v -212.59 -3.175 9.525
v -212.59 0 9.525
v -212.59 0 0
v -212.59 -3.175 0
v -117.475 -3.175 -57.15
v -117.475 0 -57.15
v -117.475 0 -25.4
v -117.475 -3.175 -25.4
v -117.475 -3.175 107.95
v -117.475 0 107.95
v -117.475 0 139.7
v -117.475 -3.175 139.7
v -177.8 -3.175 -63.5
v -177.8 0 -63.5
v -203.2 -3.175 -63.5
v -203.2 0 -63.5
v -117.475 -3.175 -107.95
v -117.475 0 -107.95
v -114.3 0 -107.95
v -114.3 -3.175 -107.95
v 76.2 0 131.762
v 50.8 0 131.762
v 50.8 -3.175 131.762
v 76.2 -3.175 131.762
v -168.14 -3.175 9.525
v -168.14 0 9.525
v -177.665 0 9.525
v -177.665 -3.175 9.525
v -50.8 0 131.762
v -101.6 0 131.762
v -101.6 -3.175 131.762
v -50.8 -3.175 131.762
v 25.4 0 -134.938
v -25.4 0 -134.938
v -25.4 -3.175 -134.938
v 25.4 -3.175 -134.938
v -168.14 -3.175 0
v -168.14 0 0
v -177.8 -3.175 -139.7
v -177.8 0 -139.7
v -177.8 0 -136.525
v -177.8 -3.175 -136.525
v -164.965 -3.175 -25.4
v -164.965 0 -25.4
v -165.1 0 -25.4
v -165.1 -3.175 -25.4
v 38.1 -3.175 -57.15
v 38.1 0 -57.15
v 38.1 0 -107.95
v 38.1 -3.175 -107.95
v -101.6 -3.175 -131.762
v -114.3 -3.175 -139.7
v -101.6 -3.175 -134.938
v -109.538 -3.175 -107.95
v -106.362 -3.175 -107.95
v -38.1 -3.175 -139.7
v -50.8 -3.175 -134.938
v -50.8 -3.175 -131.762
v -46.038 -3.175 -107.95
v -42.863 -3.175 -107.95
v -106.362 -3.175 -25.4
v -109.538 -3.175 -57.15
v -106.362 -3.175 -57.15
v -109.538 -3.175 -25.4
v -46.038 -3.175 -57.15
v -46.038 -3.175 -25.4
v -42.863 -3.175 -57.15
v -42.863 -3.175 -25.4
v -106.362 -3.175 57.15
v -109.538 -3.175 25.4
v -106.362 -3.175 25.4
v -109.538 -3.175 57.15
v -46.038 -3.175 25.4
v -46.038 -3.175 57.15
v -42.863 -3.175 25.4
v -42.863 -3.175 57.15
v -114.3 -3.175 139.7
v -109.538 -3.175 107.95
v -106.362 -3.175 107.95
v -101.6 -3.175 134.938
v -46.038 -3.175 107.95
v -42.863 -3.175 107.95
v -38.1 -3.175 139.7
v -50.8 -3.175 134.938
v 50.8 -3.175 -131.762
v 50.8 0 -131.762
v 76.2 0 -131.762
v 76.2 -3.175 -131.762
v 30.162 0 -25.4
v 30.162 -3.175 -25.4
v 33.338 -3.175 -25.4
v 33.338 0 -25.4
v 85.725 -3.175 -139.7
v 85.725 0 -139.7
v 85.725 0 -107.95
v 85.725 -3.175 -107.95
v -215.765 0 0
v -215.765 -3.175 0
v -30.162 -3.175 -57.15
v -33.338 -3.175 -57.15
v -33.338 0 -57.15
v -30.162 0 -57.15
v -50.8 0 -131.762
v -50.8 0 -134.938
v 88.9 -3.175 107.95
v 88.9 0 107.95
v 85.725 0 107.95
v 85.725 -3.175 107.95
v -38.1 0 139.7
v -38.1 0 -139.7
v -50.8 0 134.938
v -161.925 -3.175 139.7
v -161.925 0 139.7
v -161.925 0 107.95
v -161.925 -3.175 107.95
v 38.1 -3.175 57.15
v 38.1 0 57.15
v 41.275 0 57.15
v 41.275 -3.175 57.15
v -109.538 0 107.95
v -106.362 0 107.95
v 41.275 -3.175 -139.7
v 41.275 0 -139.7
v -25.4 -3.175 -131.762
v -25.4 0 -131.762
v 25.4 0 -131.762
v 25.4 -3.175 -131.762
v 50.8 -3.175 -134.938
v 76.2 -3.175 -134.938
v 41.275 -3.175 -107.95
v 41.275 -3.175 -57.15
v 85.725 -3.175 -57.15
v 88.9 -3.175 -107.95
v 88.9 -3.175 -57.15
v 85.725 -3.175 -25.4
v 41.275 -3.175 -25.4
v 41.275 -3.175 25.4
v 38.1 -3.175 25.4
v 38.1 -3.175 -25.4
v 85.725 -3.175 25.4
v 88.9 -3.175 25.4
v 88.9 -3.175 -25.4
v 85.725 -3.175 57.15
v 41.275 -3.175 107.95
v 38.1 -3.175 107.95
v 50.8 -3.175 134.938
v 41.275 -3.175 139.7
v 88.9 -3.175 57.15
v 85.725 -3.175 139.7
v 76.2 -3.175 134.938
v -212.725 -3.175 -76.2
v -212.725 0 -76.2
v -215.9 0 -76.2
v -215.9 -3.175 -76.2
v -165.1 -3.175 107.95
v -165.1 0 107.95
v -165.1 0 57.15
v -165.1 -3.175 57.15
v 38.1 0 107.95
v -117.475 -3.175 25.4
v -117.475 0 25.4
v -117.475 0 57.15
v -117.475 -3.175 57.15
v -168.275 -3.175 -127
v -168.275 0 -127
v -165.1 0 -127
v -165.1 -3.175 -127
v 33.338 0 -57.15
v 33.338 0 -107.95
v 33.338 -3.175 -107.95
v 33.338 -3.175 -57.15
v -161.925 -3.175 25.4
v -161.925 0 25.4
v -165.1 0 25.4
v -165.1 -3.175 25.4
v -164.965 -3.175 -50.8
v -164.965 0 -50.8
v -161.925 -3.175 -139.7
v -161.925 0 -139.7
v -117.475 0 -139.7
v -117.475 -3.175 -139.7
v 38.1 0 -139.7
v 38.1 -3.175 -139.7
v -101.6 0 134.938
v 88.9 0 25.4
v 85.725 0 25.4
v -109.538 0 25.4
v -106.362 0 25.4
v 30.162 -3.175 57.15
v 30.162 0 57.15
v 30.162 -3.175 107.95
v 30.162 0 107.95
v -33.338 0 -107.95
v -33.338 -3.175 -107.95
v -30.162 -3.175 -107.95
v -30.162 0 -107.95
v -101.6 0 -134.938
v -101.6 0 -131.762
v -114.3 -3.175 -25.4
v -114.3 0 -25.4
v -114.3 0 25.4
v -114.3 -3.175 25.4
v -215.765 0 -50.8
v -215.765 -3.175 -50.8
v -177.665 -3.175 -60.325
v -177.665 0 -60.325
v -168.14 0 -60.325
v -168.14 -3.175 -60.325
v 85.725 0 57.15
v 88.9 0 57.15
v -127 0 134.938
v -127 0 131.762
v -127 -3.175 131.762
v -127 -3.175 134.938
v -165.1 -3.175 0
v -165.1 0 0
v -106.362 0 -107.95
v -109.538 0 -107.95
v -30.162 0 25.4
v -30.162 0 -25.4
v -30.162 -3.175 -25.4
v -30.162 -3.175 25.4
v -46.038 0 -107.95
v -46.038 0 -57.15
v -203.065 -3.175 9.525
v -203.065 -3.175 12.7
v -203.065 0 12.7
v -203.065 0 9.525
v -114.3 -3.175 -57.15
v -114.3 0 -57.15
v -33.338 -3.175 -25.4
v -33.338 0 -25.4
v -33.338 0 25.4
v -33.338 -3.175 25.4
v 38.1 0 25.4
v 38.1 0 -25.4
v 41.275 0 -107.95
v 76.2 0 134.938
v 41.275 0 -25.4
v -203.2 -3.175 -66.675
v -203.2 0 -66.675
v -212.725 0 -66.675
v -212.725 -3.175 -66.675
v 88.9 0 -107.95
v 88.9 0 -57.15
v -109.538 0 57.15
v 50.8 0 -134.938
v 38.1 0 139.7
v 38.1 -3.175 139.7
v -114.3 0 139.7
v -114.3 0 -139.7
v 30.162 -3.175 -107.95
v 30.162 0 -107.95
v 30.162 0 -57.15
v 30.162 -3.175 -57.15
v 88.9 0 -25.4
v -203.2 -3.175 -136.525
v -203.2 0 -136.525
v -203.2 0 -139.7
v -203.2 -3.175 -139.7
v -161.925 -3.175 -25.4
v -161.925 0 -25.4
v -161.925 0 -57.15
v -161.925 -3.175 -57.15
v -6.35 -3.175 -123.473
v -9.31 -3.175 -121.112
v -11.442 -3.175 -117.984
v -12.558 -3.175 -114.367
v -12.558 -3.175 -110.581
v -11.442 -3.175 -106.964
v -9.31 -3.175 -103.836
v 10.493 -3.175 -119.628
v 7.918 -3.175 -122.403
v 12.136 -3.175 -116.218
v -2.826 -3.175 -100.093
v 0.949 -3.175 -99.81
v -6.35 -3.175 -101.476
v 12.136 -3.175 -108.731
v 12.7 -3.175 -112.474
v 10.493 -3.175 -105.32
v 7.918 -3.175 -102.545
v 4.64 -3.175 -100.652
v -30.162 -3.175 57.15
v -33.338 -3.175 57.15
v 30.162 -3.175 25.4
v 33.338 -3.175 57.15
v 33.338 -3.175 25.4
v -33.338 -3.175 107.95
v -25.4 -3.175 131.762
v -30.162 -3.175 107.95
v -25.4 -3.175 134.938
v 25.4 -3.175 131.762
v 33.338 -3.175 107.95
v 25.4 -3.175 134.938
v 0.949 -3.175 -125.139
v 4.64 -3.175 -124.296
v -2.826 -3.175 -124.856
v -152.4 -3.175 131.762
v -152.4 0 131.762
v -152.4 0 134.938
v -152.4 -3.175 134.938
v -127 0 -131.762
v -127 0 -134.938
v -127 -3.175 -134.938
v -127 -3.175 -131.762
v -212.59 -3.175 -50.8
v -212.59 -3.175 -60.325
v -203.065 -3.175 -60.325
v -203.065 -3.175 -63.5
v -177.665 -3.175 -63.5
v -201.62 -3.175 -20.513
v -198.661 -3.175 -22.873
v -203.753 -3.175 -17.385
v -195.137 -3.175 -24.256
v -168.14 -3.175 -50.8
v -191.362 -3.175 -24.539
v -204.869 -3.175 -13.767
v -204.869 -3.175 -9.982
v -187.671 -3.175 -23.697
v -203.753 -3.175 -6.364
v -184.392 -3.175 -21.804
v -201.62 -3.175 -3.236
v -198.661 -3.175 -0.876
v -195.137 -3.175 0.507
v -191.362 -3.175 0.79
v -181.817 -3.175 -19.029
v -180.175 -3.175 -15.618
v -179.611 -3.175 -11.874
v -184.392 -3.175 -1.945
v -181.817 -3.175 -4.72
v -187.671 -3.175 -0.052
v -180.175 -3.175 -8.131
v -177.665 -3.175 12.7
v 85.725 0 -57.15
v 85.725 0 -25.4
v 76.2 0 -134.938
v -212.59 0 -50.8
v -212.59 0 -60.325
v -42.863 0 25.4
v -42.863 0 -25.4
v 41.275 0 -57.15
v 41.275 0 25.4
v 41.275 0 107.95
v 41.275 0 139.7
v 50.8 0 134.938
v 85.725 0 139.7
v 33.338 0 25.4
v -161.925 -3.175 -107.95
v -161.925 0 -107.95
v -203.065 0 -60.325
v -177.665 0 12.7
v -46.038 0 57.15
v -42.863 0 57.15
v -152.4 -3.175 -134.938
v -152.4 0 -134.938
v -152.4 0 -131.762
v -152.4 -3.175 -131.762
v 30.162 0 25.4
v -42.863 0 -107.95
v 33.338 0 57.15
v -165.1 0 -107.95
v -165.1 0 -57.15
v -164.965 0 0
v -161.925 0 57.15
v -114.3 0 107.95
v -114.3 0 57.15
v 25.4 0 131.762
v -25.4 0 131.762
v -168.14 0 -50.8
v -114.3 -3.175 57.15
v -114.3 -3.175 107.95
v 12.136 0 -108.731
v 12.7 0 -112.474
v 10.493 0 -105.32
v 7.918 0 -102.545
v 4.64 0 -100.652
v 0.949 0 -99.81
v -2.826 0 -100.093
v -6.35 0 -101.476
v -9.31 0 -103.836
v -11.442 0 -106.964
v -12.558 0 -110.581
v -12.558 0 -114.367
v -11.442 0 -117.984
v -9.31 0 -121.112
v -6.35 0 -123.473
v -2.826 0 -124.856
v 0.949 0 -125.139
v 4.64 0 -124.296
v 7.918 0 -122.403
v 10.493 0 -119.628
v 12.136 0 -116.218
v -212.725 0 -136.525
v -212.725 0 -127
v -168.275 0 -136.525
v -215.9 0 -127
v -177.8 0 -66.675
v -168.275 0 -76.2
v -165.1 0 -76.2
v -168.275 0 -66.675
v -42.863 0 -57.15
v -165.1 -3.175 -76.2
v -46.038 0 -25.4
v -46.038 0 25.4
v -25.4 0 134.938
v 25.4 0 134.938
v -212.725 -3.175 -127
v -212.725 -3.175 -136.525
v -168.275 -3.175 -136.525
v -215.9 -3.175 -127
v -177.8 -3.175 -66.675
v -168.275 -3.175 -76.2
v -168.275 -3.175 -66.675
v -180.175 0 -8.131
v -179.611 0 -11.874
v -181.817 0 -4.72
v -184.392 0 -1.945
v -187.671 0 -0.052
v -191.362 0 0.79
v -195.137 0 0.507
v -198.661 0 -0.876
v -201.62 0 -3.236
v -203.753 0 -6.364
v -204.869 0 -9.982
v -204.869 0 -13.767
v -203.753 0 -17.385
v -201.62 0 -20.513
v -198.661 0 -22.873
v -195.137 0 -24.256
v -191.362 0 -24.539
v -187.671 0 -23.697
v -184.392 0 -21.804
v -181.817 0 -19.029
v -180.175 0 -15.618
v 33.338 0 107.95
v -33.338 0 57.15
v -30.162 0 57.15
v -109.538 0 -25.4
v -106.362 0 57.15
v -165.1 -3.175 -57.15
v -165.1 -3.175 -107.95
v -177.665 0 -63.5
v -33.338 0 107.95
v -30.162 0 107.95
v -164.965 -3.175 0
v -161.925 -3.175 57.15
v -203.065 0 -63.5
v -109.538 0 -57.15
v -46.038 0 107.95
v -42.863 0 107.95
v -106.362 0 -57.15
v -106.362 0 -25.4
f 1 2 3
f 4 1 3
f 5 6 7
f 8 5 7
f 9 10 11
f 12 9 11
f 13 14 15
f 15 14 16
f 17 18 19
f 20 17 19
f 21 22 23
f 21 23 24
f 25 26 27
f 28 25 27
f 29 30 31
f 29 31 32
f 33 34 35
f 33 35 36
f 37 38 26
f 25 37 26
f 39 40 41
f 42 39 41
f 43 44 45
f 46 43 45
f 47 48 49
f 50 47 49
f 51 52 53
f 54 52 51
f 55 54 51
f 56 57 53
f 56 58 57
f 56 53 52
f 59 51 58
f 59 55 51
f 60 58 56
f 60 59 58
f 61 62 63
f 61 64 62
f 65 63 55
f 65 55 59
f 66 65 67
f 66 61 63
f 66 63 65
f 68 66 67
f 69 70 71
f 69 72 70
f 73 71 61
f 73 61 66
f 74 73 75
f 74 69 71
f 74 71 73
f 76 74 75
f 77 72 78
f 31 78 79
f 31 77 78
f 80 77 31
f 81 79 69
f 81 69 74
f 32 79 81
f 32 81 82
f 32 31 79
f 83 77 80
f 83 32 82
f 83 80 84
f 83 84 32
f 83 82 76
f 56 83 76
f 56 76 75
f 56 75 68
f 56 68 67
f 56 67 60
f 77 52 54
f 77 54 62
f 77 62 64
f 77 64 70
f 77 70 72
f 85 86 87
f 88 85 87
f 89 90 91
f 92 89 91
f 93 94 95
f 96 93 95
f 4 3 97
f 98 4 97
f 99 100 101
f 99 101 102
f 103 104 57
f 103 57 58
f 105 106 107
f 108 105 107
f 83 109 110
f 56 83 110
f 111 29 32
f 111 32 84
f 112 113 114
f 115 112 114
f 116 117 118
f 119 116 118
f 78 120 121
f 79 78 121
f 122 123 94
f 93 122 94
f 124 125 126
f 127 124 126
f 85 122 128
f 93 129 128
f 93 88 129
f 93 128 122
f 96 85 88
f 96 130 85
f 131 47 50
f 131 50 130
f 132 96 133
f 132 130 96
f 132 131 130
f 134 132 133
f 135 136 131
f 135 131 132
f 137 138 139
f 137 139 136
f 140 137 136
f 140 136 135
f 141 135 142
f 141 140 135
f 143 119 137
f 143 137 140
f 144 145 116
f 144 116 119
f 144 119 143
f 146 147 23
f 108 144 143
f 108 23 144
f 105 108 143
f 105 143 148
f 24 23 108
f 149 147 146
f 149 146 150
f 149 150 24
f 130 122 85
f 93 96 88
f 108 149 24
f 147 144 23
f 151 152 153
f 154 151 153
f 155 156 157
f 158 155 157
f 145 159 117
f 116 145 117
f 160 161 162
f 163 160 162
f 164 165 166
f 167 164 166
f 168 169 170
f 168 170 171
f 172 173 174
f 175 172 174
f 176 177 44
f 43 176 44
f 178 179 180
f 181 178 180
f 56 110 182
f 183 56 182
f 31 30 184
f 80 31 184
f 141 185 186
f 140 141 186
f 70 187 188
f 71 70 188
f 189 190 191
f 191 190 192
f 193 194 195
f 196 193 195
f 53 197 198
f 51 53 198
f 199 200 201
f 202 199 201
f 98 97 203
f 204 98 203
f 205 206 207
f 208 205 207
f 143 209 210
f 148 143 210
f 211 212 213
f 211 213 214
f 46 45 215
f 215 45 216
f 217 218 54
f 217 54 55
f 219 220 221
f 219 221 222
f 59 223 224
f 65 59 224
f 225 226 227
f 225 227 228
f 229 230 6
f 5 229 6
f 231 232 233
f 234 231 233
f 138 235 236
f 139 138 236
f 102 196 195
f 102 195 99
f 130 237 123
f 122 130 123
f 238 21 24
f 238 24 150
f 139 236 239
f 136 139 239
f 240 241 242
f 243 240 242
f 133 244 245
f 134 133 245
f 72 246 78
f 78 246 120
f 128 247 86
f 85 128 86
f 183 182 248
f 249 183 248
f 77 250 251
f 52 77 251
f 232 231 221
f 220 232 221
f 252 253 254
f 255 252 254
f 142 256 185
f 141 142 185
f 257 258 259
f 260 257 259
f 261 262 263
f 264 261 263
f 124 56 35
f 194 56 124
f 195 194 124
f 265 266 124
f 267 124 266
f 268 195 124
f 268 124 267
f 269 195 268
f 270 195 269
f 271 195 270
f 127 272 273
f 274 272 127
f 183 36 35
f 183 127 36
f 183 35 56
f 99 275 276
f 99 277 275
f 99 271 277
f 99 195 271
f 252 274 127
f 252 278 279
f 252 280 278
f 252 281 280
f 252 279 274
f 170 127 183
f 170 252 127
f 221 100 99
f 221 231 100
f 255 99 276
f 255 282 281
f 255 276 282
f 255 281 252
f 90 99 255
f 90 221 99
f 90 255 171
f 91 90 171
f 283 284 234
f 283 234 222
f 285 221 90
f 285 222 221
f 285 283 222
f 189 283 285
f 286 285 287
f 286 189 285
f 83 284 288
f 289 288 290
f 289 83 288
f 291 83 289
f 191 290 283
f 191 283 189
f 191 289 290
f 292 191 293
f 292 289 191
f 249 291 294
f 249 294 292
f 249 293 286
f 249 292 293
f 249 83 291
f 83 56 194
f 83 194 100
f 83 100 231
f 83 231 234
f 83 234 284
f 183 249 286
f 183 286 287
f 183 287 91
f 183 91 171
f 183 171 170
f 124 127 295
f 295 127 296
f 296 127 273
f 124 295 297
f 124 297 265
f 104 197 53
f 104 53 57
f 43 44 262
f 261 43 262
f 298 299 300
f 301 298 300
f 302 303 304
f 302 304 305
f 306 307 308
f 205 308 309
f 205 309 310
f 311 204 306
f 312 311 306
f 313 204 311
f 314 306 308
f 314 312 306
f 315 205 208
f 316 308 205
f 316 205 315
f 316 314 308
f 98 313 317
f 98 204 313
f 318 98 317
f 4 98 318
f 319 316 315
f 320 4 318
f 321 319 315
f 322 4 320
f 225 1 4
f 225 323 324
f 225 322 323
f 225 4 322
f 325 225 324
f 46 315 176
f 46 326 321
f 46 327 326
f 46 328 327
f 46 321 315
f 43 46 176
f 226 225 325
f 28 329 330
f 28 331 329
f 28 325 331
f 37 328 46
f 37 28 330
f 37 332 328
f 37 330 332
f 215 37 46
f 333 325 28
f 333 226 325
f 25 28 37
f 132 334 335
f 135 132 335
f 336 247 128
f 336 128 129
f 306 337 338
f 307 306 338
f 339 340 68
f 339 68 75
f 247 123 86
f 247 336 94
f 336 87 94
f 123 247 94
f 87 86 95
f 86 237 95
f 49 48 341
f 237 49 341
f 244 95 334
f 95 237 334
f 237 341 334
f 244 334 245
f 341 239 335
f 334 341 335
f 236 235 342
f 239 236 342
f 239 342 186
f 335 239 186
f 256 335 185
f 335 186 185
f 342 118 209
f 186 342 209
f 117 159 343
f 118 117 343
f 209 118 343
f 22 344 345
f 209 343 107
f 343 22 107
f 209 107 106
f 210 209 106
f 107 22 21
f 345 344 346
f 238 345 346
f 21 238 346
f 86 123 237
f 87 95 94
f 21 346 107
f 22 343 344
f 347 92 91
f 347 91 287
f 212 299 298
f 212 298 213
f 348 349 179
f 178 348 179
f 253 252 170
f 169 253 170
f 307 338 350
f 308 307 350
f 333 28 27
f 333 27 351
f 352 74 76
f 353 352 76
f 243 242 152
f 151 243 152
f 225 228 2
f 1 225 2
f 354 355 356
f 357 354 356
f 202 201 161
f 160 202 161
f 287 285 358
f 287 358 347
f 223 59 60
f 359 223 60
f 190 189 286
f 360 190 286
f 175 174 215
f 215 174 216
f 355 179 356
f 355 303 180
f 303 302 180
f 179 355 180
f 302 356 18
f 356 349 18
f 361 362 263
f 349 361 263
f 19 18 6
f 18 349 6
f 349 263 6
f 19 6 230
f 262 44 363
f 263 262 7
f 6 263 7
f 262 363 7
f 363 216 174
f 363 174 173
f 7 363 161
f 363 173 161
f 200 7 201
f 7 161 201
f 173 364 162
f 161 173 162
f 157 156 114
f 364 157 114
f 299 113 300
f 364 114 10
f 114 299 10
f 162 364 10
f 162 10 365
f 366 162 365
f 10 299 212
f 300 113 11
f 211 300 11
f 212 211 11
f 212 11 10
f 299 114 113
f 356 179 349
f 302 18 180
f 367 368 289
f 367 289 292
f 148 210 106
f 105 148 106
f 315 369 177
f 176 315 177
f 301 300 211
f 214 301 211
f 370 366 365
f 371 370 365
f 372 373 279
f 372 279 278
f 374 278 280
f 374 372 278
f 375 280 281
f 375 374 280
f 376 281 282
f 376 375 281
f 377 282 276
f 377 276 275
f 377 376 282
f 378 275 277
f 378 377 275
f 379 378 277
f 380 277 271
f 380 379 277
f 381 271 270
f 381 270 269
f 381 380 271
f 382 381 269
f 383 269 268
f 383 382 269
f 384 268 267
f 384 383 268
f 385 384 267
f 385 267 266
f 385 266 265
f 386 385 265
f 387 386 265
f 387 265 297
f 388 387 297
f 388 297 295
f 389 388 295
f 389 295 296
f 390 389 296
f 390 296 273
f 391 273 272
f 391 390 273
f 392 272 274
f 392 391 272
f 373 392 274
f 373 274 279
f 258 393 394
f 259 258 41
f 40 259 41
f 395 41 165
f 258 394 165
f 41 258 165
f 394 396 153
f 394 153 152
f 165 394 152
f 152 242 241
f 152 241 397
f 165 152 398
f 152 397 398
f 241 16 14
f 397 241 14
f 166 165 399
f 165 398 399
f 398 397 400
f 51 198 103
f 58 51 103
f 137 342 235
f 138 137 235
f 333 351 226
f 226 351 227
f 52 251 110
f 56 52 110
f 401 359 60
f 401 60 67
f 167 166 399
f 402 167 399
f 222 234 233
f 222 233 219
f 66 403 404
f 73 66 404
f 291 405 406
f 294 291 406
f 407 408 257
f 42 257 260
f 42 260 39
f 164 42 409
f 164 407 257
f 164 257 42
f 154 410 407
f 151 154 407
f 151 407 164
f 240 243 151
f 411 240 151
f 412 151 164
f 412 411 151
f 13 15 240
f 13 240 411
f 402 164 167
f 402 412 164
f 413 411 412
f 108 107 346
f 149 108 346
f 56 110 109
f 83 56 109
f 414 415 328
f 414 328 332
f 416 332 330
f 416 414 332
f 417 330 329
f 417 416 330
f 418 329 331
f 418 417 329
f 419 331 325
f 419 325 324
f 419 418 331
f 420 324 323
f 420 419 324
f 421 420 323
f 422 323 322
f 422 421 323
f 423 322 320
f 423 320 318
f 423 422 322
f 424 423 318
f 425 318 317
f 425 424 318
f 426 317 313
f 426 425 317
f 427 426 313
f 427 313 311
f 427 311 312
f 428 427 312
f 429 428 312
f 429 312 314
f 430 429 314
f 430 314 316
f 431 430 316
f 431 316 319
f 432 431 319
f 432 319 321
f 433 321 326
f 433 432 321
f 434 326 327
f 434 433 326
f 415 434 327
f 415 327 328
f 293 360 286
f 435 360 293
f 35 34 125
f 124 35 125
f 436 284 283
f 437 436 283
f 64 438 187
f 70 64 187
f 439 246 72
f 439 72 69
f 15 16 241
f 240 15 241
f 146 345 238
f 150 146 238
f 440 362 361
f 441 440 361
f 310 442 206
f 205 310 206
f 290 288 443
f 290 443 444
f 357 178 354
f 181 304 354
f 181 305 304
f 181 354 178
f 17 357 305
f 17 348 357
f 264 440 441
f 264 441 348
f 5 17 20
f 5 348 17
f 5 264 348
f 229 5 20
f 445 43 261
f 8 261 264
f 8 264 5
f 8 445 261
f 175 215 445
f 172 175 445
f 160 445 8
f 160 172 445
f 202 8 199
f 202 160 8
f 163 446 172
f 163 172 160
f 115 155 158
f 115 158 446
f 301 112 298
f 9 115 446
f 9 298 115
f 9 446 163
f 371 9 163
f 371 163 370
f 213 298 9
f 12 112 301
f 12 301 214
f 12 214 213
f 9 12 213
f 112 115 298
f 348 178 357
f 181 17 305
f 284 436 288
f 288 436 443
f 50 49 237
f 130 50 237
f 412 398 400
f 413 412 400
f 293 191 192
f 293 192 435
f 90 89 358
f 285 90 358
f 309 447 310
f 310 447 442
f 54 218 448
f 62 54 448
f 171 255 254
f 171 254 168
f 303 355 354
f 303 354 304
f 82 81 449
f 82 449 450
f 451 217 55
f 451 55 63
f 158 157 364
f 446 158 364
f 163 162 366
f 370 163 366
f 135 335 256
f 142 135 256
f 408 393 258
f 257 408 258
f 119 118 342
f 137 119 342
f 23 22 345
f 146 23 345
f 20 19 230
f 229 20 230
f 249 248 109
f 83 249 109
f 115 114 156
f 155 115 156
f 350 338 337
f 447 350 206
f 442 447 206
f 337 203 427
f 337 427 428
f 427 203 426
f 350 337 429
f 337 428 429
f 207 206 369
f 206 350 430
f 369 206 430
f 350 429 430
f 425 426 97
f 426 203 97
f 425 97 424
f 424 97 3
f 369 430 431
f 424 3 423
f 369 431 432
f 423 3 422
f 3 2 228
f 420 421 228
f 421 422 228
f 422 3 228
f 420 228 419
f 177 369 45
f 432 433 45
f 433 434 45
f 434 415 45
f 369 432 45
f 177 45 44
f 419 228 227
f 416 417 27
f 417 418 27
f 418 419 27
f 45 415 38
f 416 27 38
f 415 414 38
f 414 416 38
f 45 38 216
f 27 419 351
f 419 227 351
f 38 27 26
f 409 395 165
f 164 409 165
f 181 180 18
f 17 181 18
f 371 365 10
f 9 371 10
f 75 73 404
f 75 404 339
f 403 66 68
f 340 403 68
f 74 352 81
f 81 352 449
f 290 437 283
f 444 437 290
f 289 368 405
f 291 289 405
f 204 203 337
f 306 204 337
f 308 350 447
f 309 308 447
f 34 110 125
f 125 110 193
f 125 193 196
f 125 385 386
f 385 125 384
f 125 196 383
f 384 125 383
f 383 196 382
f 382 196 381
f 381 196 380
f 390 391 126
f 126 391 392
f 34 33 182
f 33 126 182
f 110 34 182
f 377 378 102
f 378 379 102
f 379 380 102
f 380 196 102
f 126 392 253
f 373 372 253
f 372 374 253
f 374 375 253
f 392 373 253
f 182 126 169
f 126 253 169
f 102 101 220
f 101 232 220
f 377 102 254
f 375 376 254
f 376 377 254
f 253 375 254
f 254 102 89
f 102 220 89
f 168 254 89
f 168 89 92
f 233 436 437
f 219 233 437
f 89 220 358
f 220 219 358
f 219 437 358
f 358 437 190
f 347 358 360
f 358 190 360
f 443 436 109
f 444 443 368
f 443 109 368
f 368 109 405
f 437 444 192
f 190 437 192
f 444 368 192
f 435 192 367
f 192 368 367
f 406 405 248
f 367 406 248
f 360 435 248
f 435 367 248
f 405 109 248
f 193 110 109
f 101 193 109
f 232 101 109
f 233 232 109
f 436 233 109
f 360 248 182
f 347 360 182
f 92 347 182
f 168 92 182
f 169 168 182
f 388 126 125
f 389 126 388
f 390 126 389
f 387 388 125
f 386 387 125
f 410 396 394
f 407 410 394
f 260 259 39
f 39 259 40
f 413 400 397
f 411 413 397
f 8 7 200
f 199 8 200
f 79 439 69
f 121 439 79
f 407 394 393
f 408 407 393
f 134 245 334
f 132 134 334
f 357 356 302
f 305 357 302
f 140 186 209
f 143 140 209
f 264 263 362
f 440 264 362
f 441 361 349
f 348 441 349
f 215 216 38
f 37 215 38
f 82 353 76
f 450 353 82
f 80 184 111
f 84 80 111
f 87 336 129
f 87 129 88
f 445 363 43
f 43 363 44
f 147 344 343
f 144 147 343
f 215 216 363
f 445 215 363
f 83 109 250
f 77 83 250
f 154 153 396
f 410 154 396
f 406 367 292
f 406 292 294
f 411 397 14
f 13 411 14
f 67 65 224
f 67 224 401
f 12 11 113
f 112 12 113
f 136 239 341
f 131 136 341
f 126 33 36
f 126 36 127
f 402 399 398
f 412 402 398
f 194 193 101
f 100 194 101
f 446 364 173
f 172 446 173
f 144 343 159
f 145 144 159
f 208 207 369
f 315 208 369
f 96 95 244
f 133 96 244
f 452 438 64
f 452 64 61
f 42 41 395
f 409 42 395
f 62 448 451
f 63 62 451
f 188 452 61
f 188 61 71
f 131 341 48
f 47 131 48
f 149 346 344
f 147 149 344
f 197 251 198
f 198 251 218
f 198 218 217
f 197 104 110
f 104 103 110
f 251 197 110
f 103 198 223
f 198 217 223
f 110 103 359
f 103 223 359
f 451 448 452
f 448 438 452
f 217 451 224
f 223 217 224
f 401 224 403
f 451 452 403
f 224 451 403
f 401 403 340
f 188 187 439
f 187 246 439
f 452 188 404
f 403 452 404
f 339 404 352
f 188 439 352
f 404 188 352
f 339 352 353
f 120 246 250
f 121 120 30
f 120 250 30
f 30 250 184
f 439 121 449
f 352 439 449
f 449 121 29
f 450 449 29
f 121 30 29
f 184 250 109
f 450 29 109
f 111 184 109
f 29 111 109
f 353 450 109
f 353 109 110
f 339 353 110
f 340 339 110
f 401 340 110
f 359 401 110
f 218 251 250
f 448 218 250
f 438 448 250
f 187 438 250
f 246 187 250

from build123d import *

# Parameters (mm, degrees)
F0_W     = 50.8
F0_H     = 3.175
F0_W_2   = 3.175
F0_H_2   = 50.8
F1_DEPTH = 3.175
F0_R     = 12.7
F2_DEPTH = 3.175
F0_W_3   = 25.4
F3_DEPTH = 3.175
F4_DEPTH = 3.175
F5_DEPTH = 3.175
F6_DEPTH = 3.175


with BuildPart() as f1:
    # F0 (on Front) → F1 (new body)
    with BuildSketch(Plane.XZ):
        Polygon((-38.1, -139.7), (-38.1, 139.7), (-114.3, 139.7), (-114.3, 107.95), (-114.3, 57.15), (-114.3, 25.4), (-114.3, -25.4), (-114.3, -57.15), (-114.3, -107.95), (-114.3, -139.7), align=None)
        with Locations((-76.2, -133.35)):
            Rectangle(F0_W, F0_H, mode=Mode.SUBTRACT)
        with Locations((-107.95, -82.55)):
            Rectangle(F0_W_2, F0_H_2, mode=Mode.SUBTRACT)
        with Locations((-44.45, -82.55)):
            Rectangle(F0_W_2, F0_H_2, mode=Mode.SUBTRACT)
        with Locations((-107.95, 0)):
            Rectangle(F0_W_2, F0_H_2, mode=Mode.SUBTRACT)
        with Locations((-107.95, 82.55)):
            Rectangle(F0_W_2, F0_H_2, mode=Mode.SUBTRACT)
        with Locations((-76.2, 133.35)):
            Rectangle(F0_W, F0_H, mode=Mode.SUBTRACT)
        with Locations((-44.45, 0)):
            Rectangle(F0_W_2, F0_H_2, mode=Mode.SUBTRACT)
        with Locations((-44.45, 82.55)):
            Rectangle(F0_W_2, F0_H_2, mode=Mode.SUBTRACT)
    extrude(amount=F1_DEPTH)


with BuildPart() as f2:
    # F0 (on Front) → F2 (new body)
    with BuildSketch(Plane.XZ):
        Polygon((38.1, 139.7), (-38.1, 139.7), (-38.1, -139.7), (38.1, -139.7), (38.1, -107.95), (38.1, -57.15), (38.1, -25.4), (38.1, 25.4), (38.1, 57.15), (38.1, 107.95), align=None)
        with Locations((0, -133.35)):
            Rectangle(F0_W, F0_H, mode=Mode.SUBTRACT)
        with Locations((0, -112.474121)):
            Circle(F0_R, mode=Mode.SUBTRACT)
        with Locations((-31.75, -82.55)):
            Rectangle(F0_W_2, F0_H_2, mode=Mode.SUBTRACT)
        with Locations((31.75, -82.55)):
            Rectangle(F0_W_2, F0_H_2, mode=Mode.SUBTRACT)
        with Locations((-31.75, 0)):
            Rectangle(F0_W_2, F0_H_2, mode=Mode.SUBTRACT)
        with Locations((31.75, 0)):
            Rectangle(F0_W_2, F0_H_2, mode=Mode.SUBTRACT)
        with Locations((-31.75, 82.55)):
            Rectangle(F0_W_2, F0_H_2, mode=Mode.SUBTRACT)
        with Locations((0, 133.35)):
            Rectangle(F0_W, F0_H, mode=Mode.SUBTRACT)
        with Locations((31.75, 82.55)):
            Rectangle(F0_W_2, F0_H_2, mode=Mode.SUBTRACT)
    extrude(amount=F2_DEPTH)


with BuildPart() as f3:
    # F0 (on Front) → F3 (new body)
    with BuildSketch(Plane.XZ):
        Polygon((41.275, 107.95), (38.1, 107.95), (38.1, 57.15), (41.275, 57.15), (41.275, 25.4), (38.1, 25.4), (38.1, -25.4), (41.275, -25.4), (41.275, -57.15), (38.1, -57.15), (38.1, -107.95), (41.275, -107.95), (41.275, -134.9375), (41.275, -139.7), (85.725, -139.7), (85.725, -134.9375), (85.725, -107.95), (88.9, -107.95), (88.9, -57.15), (85.725, -57.15), (85.725, -25.4), (88.9, -25.4), (88.9, 25.4), (85.725, 25.4), (85.725, 57.15), (88.9, 57.15), (88.9, 107.95), (85.725, 107.95), (85.725, 134.9375), (85.725, 139.7), (41.275, 139.7), (41.275, 134.9375), align=None)
        with Locations((63.5, -133.35)):
            Rectangle(F0_W_3, F0_H, mode=Mode.SUBTRACT)
        with Locations((63.5, 133.35)):
            Rectangle(F0_W_3, F0_H, mode=Mode.SUBTRACT)
    extrude(amount=F3_DEPTH)


with BuildPart() as f4:
    # F0 (on Front) → F4 (new body)
    with BuildSketch(Plane.XZ):
        Polygon((-114.3, 57.15), (-114.3, 107.95), (-117.475, 107.95), (-117.475, 134.9375), (-117.475, 139.7), (-161.925, 139.7), (-161.925, 134.9375), (-161.925, 107.95), (-165.1, 107.95), (-165.1, 57.15), (-161.925, 57.15), (-161.925, 25.4), (-165.1, 25.4), (-165.1, 0), (-164.964784, 0), (-164.964784, -25.4), (-161.925, -25.4), (-161.925, -57.15), (-165.1, -57.15), (-165.1, -58.7375), (-165.1, -63.5), (-165.1, -76.2), (-165.1, -107.95), (-161.925, -107.95), (-161.925, -134.9375), (-161.925, -139.7), (-117.475, -139.7), (-117.475, -134.9375), (-117.475, -107.95), (-114.3, -107.95), (-114.3, -57.15), (-117.475, -57.15), (-117.475, -25.4), (-114.3, -25.4), (-114.3, 25.4), (-117.475, 25.4), (-117.475, 57.15), align=None)
        with Locations((-139.7, -133.35)):
            Rectangle(F0_W_3, F0_H, mode=Mode.SUBTRACT)
        with Locations((-139.7, 133.35)):
            Rectangle(F0_W_3, F0_H, mode=Mode.SUBTRACT)
    extrude(amount=F4_DEPTH)


with BuildPart() as f5:
    # F0 (on Front) → F5 (new body)
    with BuildSketch(Plane.XZ):
        Polygon((-165.1, -25.4), (-165.1, 0), (-168.139784, 0), (-168.139784, 9.525), (-177.664784, 9.525), (-177.664784, 12.7), (-203.064784, 12.7), (-203.064784, 9.525), (-212.589784, 9.525), (-212.589784, 0), (-215.764784, 0), (-215.764784, -50.8), (-212.589784, -50.8), (-212.589784, -60.325), (-203.064784, -60.325), (-203.064784, -63.5), (-177.8, -63.5), (-177.664784, -63.5), (-177.664784, -60.325), (-168.139784, -60.325), (-168.139784, -50.8), (-164.964784, -50.8), (-164.964784, -25.4), align=None)
        with Locations((-192.310721, -11.874435)):
            Circle(F0_R, mode=Mode.SUBTRACT)
    extrude(amount=F5_DEPTH)


with BuildPart() as f6:
    # F0 (on Front) → F6 (new body)
    with BuildSketch(Plane.XZ):
        Polygon((-165.1, -127), (-165.1, -107.95), (-165.1, -76.2), (-168.275, -76.2), (-168.275, -66.675), (-177.8, -66.675), (-177.8, -63.5), (-203.064784, -63.5), (-203.2, -63.5), (-203.2, -66.675), (-212.725, -66.675), (-212.725, -76.2), (-215.9, -76.2), (-215.9, -127), (-212.725, -127), (-212.725, -136.525), (-203.2, -136.525), (-203.2, -139.7), (-177.8, -139.7), (-177.8, -136.525), (-168.275, -136.525), (-168.275, -127), align=None)
    extrude(amount=F6_DEPTH)


solid = Compound([f1.part, f2.part, f3.part, f4.part, f5.part, f6.part])
